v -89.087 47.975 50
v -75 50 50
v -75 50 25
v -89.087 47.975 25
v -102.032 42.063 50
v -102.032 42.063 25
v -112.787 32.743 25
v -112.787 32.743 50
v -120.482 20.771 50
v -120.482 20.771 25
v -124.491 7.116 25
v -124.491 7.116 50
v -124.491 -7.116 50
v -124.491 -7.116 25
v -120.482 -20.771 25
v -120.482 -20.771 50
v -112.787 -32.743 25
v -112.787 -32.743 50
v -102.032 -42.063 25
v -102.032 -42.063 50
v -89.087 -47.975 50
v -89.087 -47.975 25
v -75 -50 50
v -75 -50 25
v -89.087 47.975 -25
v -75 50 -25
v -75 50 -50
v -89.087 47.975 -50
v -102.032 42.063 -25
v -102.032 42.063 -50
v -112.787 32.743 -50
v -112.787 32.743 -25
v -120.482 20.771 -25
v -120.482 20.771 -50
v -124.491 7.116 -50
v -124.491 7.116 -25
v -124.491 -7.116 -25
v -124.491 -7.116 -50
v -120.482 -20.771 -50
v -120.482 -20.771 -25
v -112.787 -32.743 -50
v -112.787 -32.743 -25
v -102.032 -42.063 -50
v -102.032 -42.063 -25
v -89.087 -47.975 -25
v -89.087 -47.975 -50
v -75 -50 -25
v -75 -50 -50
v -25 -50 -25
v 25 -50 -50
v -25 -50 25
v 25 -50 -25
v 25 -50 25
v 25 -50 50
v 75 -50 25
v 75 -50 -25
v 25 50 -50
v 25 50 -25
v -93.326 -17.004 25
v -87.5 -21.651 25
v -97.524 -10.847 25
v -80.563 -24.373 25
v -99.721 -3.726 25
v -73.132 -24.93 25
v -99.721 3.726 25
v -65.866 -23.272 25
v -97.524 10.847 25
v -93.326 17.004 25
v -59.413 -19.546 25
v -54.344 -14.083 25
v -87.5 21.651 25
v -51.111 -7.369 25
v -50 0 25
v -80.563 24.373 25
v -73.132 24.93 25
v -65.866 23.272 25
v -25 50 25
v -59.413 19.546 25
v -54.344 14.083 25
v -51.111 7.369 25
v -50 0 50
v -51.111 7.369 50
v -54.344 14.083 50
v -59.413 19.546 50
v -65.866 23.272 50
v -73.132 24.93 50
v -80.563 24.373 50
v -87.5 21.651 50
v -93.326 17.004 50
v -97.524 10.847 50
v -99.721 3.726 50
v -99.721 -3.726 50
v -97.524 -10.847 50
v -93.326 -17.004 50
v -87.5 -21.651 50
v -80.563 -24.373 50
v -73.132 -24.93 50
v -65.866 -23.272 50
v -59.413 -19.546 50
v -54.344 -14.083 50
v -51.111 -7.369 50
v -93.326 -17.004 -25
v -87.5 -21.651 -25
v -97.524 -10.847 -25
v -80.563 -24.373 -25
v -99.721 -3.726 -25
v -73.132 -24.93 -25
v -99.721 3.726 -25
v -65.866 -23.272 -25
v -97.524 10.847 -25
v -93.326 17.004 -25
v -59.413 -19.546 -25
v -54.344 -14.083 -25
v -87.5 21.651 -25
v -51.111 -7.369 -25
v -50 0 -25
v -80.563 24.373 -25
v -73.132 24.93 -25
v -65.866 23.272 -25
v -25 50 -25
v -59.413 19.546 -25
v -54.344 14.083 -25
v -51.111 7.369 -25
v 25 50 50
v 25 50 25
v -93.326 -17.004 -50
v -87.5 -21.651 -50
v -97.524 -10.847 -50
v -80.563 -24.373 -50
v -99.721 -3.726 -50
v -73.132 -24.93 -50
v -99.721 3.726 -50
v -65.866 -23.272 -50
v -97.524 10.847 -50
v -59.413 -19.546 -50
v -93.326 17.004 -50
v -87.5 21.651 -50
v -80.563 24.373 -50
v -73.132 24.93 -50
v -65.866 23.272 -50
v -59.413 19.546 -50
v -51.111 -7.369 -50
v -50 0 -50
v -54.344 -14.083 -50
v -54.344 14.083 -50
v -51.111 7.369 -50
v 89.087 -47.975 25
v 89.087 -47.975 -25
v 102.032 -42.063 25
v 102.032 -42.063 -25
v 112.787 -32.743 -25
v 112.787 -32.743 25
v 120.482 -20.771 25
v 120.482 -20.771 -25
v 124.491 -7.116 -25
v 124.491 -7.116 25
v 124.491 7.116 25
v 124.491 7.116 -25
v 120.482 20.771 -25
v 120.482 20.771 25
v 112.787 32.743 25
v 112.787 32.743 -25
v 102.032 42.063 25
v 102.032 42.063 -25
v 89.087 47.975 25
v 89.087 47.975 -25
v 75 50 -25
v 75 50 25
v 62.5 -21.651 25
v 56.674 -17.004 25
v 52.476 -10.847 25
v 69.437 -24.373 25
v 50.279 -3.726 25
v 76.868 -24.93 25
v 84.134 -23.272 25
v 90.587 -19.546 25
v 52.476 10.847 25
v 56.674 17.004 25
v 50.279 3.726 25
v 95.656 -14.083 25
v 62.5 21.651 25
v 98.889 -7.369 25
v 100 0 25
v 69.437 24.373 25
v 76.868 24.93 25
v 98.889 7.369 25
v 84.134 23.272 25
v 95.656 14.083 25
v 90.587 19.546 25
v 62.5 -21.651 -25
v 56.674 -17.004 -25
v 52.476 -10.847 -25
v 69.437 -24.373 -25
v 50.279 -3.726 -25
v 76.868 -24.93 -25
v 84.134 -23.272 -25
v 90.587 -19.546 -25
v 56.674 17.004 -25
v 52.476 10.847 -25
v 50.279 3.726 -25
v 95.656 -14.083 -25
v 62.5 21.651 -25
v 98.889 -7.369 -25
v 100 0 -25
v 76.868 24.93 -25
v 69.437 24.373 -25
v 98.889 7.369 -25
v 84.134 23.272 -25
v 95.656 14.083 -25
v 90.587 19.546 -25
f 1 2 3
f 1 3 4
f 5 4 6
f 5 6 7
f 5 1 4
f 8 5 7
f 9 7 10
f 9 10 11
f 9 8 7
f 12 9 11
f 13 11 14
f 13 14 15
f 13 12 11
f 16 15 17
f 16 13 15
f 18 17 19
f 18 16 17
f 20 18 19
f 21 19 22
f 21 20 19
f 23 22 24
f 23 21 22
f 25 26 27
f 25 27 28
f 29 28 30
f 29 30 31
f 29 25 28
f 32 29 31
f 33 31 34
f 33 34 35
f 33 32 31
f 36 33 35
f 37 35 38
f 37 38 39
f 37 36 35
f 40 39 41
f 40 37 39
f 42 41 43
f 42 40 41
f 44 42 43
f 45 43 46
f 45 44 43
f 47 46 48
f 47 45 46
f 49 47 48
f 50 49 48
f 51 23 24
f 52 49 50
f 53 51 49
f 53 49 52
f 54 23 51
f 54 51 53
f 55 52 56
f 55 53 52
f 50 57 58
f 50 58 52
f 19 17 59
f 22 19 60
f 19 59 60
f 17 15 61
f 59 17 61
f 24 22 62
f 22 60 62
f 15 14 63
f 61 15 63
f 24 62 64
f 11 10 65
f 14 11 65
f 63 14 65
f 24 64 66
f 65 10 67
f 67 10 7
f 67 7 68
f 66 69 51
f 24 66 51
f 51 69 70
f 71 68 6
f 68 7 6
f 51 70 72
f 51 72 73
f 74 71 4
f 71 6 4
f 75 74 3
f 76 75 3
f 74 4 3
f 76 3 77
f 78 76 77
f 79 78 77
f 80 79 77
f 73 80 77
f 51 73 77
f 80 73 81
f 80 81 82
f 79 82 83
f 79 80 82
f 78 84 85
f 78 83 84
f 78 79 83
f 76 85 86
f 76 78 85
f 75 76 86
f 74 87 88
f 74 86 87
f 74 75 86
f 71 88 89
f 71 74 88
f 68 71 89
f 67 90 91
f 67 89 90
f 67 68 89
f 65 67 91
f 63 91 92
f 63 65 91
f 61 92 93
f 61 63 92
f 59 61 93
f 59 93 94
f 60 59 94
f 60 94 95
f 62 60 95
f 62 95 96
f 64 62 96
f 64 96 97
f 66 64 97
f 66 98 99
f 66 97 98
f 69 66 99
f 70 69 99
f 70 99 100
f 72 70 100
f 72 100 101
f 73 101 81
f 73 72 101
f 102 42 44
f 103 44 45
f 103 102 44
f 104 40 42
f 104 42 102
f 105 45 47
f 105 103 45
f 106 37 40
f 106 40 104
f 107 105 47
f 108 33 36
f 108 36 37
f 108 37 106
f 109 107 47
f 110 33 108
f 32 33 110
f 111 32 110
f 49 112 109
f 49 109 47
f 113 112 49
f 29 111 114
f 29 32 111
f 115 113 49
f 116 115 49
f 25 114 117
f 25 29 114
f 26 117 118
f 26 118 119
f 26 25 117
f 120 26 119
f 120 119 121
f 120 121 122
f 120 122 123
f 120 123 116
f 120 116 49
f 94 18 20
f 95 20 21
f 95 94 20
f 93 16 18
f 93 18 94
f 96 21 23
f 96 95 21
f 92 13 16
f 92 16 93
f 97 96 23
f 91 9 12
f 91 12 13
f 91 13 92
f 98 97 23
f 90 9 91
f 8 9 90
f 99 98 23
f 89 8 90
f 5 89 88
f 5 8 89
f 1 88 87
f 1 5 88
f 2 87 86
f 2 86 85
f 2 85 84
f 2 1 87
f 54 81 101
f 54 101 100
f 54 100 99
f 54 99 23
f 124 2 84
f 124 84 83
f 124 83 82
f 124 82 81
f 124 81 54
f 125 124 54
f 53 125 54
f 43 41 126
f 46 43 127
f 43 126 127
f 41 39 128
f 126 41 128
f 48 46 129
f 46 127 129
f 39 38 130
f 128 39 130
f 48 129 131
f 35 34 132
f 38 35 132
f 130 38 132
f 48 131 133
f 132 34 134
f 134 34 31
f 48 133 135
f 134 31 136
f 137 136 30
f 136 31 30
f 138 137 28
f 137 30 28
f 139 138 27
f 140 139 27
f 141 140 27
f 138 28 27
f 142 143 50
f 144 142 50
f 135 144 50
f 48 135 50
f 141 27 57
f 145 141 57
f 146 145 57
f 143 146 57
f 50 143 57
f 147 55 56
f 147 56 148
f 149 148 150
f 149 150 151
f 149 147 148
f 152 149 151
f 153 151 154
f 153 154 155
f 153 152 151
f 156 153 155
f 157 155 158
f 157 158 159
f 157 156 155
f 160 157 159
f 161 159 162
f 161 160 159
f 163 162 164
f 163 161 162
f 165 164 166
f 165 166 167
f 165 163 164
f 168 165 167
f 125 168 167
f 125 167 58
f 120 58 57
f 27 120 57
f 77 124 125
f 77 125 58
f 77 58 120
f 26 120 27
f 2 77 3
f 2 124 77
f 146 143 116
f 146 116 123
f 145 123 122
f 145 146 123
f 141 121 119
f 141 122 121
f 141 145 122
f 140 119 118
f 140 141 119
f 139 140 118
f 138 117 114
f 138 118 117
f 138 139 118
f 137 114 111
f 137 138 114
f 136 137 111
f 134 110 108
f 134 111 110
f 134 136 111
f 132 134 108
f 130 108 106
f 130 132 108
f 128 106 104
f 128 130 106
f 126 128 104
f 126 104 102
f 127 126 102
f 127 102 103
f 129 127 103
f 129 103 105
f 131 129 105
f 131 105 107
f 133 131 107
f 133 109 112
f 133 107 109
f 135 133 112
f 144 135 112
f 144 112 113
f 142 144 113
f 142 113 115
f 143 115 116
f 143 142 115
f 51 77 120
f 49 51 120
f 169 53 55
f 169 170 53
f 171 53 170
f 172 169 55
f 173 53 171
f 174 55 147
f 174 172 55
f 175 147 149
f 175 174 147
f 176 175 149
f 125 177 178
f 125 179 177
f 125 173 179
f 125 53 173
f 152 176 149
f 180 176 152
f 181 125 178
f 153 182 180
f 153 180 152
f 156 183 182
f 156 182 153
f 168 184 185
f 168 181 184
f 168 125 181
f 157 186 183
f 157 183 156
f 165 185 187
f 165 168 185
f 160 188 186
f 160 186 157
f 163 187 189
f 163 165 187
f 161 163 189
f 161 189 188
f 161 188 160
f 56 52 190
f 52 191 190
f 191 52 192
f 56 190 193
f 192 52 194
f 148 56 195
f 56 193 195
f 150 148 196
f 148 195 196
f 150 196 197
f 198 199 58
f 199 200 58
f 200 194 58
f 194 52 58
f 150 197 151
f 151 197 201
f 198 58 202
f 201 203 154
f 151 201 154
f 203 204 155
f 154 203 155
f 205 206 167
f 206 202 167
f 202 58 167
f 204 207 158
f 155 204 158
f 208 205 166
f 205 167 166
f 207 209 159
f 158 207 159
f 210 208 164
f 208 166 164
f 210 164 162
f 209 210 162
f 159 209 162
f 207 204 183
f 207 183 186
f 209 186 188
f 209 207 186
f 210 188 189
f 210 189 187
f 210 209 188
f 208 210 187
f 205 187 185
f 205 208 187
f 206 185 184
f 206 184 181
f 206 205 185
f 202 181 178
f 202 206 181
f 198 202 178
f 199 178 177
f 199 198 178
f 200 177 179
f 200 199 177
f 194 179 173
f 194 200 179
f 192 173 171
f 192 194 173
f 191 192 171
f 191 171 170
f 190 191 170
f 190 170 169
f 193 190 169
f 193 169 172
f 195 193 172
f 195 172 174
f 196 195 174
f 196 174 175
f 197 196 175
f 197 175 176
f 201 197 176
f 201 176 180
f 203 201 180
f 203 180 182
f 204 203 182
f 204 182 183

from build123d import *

# Parameters (mm, degrees)
BOSS_EXTRUDE1_DEPTH     = 50
CUT_EXTRUDE1_DEPTH      = 25
SKETCH7_W               = 50
SKETCH7_H               = 50
CUT_EXTRUDE2_DEPTH      = 168.705098312
CUT_EXTRUDE3_DEPTH      = 168.705098312
CUT_EXTRUDE3_DEPTH_BACK = 168.705098312
SKETCH8_R               = 25
CUT_EXTRUDE4_DEPTH      = 168.705098312
CUT_EXTRUDE4_DEPTH_BACK = 168.705098312
SKETCH9_R               = 25
SKETCH15_R              = 25
CUT_EXTRUDE5_DEPTH      = 25


with BuildPart() as part:
    # Sketch2 → Boss-Extrude1 (new, symmetric)
    with BuildSketch(Plane.XY):
        with BuildLine():
            ThreePointArc((-75, 50), (-125, 0), (-75, -50))
            Line((-75, -50), (-75, 50))
        make_face()
        with BuildLine():
            Line((-75, 50), (-75, -50))
            ThreePointArc((-75, -50), (-39.644660941, -35.355339059), (-25, 0))
            ThreePointArc((-25, 0), (-39.644660941, 35.355339059), (-75, 50))
        make_face()
        with BuildLine():
            ThreePointArc((-75, 50), (-125, 0), (-75, -50))
            Line((-75, -50), (-75, 50))
        make_face()
        with BuildLine():
            Line((-75, 50), (-75, -50))
            ThreePointArc((-75, -50), (-39.644660941, -35.355339059), (-25, 0))
            ThreePointArc((-25, 0), (-39.644660941, 35.355339059), (-75, 50))
        make_face()
        with BuildLine():
            ThreePointArc((-25, 0), (-39.644660941, -35.355339059), (-75, -50))
            Line((-75, -50), (75, -50))
            ThreePointArc((75, -50), (25, 0), (75, 50))
            Line((75, 50), (-75, 50))
            ThreePointArc((-75, 50), (-39.644660941, 35.355339059), (-25, 0))
        make_face()
        with BuildLine():
            ThreePointArc((75, 50), (25, 0), (75, -50))
            Line((75, -50), (75, 50))
        make_face()
        with BuildLine():
            Line((75, 50), (75, -50))
            ThreePointArc((75, -50), (110.355339059, -35.355339059), (125, 0))
            ThreePointArc((125, 0), (110.355339059, 35.355339059), (75, 50))
        make_face()
        with BuildLine():
            ThreePointArc((75, 50), (25, 0), (75, -50))
            Line((75, -50), (75, 50))
        make_face()
        with BuildLine():
            Line((75, 50), (75, -50))
            ThreePointArc((75, -50), (110.355339059, -35.355339059), (125, 0))
            ThreePointArc((125, 0), (110.355339059, 35.355339059), (75, 50))
        make_face()
    extrude(amount=BOSS_EXTRUDE1_DEPTH, both=True)

    # Sketch4 → Cut-Extrude1 (cut, symmetric)
    with BuildSketch(Plane.XY):
        with BuildLine():
            Line((-75, -50), (-75, 50))
            ThreePointArc((-75, 50), (-125, 0), (-75, -50))
        make_face()
    extrude(amount=CUT_EXTRUDE1_DEPTH, both=True, mode=Mode.SUBTRACT)

    # Sketch7 → Cut-Extrude2 (cut, through all)
    with BuildSketch(Plane(origin=(0, 50, 0), x_dir=(1, 0, 0), z_dir=(0, 1, 0))):
        with Locations((-50, 0)):
            Rectangle(SKETCH7_W, SKETCH7_H)
    extrude(amount=-CUT_EXTRUDE2_DEPTH, mode=Mode.SUBTRACT)

    # Sketch8 → Cut-Extrude3 (cut, two sides: drawn at the far end of the back side and taken through both)
    with BuildSketch(Plane.XY.offset(50).offset(-CUT_EXTRUDE3_DEPTH_BACK)):
        with Locations((-75, 0)):
            Circle(SKETCH8_R)
    extrude(amount=CUT_EXTRUDE3_DEPTH + CUT_EXTRUDE3_DEPTH_BACK, mode=Mode.SUBTRACT)

    # Sketch9 → Cut-Extrude4 (cut, two sides: drawn at the far end of the back side and taken through both)
    with BuildSketch(Plane.XY.offset(50).offset(-CUT_EXTRUDE4_DEPTH_BACK)):
        with Locations((75, 0)):
            Circle(SKETCH9_R)
    extrude(amount=CUT_EXTRUDE4_DEPTH + CUT_EXTRUDE4_DEPTH_BACK, mode=Mode.SUBTRACT)

    # Sketch15 → Cut-Extrude5 (cut)
    with BuildSketch(Plane.XY.offset(50)):
        with BuildLine():
            Line((75, 50), (25, 50))
            Line((25, 50), (25, -50))
            Line((25, -50), (75, -50))
            ThreePointArc((75, -50), (125, 0), (75, 50))
        make_face()
        with Locations((75, 0)):
            Circle(SKETCH15_R, mode=Mode.SUBTRACT)
    cut_extrude5 = extrude(amount=-CUT_EXTRUDE5_DEPTH, mode=Mode.SUBTRACT)

    # Mirror1: Cut-Extrude5 across plane
    add(cut_extrude5.mirror(Plane.XY), mode=Mode.SUBTRACT)


solid = part.part
